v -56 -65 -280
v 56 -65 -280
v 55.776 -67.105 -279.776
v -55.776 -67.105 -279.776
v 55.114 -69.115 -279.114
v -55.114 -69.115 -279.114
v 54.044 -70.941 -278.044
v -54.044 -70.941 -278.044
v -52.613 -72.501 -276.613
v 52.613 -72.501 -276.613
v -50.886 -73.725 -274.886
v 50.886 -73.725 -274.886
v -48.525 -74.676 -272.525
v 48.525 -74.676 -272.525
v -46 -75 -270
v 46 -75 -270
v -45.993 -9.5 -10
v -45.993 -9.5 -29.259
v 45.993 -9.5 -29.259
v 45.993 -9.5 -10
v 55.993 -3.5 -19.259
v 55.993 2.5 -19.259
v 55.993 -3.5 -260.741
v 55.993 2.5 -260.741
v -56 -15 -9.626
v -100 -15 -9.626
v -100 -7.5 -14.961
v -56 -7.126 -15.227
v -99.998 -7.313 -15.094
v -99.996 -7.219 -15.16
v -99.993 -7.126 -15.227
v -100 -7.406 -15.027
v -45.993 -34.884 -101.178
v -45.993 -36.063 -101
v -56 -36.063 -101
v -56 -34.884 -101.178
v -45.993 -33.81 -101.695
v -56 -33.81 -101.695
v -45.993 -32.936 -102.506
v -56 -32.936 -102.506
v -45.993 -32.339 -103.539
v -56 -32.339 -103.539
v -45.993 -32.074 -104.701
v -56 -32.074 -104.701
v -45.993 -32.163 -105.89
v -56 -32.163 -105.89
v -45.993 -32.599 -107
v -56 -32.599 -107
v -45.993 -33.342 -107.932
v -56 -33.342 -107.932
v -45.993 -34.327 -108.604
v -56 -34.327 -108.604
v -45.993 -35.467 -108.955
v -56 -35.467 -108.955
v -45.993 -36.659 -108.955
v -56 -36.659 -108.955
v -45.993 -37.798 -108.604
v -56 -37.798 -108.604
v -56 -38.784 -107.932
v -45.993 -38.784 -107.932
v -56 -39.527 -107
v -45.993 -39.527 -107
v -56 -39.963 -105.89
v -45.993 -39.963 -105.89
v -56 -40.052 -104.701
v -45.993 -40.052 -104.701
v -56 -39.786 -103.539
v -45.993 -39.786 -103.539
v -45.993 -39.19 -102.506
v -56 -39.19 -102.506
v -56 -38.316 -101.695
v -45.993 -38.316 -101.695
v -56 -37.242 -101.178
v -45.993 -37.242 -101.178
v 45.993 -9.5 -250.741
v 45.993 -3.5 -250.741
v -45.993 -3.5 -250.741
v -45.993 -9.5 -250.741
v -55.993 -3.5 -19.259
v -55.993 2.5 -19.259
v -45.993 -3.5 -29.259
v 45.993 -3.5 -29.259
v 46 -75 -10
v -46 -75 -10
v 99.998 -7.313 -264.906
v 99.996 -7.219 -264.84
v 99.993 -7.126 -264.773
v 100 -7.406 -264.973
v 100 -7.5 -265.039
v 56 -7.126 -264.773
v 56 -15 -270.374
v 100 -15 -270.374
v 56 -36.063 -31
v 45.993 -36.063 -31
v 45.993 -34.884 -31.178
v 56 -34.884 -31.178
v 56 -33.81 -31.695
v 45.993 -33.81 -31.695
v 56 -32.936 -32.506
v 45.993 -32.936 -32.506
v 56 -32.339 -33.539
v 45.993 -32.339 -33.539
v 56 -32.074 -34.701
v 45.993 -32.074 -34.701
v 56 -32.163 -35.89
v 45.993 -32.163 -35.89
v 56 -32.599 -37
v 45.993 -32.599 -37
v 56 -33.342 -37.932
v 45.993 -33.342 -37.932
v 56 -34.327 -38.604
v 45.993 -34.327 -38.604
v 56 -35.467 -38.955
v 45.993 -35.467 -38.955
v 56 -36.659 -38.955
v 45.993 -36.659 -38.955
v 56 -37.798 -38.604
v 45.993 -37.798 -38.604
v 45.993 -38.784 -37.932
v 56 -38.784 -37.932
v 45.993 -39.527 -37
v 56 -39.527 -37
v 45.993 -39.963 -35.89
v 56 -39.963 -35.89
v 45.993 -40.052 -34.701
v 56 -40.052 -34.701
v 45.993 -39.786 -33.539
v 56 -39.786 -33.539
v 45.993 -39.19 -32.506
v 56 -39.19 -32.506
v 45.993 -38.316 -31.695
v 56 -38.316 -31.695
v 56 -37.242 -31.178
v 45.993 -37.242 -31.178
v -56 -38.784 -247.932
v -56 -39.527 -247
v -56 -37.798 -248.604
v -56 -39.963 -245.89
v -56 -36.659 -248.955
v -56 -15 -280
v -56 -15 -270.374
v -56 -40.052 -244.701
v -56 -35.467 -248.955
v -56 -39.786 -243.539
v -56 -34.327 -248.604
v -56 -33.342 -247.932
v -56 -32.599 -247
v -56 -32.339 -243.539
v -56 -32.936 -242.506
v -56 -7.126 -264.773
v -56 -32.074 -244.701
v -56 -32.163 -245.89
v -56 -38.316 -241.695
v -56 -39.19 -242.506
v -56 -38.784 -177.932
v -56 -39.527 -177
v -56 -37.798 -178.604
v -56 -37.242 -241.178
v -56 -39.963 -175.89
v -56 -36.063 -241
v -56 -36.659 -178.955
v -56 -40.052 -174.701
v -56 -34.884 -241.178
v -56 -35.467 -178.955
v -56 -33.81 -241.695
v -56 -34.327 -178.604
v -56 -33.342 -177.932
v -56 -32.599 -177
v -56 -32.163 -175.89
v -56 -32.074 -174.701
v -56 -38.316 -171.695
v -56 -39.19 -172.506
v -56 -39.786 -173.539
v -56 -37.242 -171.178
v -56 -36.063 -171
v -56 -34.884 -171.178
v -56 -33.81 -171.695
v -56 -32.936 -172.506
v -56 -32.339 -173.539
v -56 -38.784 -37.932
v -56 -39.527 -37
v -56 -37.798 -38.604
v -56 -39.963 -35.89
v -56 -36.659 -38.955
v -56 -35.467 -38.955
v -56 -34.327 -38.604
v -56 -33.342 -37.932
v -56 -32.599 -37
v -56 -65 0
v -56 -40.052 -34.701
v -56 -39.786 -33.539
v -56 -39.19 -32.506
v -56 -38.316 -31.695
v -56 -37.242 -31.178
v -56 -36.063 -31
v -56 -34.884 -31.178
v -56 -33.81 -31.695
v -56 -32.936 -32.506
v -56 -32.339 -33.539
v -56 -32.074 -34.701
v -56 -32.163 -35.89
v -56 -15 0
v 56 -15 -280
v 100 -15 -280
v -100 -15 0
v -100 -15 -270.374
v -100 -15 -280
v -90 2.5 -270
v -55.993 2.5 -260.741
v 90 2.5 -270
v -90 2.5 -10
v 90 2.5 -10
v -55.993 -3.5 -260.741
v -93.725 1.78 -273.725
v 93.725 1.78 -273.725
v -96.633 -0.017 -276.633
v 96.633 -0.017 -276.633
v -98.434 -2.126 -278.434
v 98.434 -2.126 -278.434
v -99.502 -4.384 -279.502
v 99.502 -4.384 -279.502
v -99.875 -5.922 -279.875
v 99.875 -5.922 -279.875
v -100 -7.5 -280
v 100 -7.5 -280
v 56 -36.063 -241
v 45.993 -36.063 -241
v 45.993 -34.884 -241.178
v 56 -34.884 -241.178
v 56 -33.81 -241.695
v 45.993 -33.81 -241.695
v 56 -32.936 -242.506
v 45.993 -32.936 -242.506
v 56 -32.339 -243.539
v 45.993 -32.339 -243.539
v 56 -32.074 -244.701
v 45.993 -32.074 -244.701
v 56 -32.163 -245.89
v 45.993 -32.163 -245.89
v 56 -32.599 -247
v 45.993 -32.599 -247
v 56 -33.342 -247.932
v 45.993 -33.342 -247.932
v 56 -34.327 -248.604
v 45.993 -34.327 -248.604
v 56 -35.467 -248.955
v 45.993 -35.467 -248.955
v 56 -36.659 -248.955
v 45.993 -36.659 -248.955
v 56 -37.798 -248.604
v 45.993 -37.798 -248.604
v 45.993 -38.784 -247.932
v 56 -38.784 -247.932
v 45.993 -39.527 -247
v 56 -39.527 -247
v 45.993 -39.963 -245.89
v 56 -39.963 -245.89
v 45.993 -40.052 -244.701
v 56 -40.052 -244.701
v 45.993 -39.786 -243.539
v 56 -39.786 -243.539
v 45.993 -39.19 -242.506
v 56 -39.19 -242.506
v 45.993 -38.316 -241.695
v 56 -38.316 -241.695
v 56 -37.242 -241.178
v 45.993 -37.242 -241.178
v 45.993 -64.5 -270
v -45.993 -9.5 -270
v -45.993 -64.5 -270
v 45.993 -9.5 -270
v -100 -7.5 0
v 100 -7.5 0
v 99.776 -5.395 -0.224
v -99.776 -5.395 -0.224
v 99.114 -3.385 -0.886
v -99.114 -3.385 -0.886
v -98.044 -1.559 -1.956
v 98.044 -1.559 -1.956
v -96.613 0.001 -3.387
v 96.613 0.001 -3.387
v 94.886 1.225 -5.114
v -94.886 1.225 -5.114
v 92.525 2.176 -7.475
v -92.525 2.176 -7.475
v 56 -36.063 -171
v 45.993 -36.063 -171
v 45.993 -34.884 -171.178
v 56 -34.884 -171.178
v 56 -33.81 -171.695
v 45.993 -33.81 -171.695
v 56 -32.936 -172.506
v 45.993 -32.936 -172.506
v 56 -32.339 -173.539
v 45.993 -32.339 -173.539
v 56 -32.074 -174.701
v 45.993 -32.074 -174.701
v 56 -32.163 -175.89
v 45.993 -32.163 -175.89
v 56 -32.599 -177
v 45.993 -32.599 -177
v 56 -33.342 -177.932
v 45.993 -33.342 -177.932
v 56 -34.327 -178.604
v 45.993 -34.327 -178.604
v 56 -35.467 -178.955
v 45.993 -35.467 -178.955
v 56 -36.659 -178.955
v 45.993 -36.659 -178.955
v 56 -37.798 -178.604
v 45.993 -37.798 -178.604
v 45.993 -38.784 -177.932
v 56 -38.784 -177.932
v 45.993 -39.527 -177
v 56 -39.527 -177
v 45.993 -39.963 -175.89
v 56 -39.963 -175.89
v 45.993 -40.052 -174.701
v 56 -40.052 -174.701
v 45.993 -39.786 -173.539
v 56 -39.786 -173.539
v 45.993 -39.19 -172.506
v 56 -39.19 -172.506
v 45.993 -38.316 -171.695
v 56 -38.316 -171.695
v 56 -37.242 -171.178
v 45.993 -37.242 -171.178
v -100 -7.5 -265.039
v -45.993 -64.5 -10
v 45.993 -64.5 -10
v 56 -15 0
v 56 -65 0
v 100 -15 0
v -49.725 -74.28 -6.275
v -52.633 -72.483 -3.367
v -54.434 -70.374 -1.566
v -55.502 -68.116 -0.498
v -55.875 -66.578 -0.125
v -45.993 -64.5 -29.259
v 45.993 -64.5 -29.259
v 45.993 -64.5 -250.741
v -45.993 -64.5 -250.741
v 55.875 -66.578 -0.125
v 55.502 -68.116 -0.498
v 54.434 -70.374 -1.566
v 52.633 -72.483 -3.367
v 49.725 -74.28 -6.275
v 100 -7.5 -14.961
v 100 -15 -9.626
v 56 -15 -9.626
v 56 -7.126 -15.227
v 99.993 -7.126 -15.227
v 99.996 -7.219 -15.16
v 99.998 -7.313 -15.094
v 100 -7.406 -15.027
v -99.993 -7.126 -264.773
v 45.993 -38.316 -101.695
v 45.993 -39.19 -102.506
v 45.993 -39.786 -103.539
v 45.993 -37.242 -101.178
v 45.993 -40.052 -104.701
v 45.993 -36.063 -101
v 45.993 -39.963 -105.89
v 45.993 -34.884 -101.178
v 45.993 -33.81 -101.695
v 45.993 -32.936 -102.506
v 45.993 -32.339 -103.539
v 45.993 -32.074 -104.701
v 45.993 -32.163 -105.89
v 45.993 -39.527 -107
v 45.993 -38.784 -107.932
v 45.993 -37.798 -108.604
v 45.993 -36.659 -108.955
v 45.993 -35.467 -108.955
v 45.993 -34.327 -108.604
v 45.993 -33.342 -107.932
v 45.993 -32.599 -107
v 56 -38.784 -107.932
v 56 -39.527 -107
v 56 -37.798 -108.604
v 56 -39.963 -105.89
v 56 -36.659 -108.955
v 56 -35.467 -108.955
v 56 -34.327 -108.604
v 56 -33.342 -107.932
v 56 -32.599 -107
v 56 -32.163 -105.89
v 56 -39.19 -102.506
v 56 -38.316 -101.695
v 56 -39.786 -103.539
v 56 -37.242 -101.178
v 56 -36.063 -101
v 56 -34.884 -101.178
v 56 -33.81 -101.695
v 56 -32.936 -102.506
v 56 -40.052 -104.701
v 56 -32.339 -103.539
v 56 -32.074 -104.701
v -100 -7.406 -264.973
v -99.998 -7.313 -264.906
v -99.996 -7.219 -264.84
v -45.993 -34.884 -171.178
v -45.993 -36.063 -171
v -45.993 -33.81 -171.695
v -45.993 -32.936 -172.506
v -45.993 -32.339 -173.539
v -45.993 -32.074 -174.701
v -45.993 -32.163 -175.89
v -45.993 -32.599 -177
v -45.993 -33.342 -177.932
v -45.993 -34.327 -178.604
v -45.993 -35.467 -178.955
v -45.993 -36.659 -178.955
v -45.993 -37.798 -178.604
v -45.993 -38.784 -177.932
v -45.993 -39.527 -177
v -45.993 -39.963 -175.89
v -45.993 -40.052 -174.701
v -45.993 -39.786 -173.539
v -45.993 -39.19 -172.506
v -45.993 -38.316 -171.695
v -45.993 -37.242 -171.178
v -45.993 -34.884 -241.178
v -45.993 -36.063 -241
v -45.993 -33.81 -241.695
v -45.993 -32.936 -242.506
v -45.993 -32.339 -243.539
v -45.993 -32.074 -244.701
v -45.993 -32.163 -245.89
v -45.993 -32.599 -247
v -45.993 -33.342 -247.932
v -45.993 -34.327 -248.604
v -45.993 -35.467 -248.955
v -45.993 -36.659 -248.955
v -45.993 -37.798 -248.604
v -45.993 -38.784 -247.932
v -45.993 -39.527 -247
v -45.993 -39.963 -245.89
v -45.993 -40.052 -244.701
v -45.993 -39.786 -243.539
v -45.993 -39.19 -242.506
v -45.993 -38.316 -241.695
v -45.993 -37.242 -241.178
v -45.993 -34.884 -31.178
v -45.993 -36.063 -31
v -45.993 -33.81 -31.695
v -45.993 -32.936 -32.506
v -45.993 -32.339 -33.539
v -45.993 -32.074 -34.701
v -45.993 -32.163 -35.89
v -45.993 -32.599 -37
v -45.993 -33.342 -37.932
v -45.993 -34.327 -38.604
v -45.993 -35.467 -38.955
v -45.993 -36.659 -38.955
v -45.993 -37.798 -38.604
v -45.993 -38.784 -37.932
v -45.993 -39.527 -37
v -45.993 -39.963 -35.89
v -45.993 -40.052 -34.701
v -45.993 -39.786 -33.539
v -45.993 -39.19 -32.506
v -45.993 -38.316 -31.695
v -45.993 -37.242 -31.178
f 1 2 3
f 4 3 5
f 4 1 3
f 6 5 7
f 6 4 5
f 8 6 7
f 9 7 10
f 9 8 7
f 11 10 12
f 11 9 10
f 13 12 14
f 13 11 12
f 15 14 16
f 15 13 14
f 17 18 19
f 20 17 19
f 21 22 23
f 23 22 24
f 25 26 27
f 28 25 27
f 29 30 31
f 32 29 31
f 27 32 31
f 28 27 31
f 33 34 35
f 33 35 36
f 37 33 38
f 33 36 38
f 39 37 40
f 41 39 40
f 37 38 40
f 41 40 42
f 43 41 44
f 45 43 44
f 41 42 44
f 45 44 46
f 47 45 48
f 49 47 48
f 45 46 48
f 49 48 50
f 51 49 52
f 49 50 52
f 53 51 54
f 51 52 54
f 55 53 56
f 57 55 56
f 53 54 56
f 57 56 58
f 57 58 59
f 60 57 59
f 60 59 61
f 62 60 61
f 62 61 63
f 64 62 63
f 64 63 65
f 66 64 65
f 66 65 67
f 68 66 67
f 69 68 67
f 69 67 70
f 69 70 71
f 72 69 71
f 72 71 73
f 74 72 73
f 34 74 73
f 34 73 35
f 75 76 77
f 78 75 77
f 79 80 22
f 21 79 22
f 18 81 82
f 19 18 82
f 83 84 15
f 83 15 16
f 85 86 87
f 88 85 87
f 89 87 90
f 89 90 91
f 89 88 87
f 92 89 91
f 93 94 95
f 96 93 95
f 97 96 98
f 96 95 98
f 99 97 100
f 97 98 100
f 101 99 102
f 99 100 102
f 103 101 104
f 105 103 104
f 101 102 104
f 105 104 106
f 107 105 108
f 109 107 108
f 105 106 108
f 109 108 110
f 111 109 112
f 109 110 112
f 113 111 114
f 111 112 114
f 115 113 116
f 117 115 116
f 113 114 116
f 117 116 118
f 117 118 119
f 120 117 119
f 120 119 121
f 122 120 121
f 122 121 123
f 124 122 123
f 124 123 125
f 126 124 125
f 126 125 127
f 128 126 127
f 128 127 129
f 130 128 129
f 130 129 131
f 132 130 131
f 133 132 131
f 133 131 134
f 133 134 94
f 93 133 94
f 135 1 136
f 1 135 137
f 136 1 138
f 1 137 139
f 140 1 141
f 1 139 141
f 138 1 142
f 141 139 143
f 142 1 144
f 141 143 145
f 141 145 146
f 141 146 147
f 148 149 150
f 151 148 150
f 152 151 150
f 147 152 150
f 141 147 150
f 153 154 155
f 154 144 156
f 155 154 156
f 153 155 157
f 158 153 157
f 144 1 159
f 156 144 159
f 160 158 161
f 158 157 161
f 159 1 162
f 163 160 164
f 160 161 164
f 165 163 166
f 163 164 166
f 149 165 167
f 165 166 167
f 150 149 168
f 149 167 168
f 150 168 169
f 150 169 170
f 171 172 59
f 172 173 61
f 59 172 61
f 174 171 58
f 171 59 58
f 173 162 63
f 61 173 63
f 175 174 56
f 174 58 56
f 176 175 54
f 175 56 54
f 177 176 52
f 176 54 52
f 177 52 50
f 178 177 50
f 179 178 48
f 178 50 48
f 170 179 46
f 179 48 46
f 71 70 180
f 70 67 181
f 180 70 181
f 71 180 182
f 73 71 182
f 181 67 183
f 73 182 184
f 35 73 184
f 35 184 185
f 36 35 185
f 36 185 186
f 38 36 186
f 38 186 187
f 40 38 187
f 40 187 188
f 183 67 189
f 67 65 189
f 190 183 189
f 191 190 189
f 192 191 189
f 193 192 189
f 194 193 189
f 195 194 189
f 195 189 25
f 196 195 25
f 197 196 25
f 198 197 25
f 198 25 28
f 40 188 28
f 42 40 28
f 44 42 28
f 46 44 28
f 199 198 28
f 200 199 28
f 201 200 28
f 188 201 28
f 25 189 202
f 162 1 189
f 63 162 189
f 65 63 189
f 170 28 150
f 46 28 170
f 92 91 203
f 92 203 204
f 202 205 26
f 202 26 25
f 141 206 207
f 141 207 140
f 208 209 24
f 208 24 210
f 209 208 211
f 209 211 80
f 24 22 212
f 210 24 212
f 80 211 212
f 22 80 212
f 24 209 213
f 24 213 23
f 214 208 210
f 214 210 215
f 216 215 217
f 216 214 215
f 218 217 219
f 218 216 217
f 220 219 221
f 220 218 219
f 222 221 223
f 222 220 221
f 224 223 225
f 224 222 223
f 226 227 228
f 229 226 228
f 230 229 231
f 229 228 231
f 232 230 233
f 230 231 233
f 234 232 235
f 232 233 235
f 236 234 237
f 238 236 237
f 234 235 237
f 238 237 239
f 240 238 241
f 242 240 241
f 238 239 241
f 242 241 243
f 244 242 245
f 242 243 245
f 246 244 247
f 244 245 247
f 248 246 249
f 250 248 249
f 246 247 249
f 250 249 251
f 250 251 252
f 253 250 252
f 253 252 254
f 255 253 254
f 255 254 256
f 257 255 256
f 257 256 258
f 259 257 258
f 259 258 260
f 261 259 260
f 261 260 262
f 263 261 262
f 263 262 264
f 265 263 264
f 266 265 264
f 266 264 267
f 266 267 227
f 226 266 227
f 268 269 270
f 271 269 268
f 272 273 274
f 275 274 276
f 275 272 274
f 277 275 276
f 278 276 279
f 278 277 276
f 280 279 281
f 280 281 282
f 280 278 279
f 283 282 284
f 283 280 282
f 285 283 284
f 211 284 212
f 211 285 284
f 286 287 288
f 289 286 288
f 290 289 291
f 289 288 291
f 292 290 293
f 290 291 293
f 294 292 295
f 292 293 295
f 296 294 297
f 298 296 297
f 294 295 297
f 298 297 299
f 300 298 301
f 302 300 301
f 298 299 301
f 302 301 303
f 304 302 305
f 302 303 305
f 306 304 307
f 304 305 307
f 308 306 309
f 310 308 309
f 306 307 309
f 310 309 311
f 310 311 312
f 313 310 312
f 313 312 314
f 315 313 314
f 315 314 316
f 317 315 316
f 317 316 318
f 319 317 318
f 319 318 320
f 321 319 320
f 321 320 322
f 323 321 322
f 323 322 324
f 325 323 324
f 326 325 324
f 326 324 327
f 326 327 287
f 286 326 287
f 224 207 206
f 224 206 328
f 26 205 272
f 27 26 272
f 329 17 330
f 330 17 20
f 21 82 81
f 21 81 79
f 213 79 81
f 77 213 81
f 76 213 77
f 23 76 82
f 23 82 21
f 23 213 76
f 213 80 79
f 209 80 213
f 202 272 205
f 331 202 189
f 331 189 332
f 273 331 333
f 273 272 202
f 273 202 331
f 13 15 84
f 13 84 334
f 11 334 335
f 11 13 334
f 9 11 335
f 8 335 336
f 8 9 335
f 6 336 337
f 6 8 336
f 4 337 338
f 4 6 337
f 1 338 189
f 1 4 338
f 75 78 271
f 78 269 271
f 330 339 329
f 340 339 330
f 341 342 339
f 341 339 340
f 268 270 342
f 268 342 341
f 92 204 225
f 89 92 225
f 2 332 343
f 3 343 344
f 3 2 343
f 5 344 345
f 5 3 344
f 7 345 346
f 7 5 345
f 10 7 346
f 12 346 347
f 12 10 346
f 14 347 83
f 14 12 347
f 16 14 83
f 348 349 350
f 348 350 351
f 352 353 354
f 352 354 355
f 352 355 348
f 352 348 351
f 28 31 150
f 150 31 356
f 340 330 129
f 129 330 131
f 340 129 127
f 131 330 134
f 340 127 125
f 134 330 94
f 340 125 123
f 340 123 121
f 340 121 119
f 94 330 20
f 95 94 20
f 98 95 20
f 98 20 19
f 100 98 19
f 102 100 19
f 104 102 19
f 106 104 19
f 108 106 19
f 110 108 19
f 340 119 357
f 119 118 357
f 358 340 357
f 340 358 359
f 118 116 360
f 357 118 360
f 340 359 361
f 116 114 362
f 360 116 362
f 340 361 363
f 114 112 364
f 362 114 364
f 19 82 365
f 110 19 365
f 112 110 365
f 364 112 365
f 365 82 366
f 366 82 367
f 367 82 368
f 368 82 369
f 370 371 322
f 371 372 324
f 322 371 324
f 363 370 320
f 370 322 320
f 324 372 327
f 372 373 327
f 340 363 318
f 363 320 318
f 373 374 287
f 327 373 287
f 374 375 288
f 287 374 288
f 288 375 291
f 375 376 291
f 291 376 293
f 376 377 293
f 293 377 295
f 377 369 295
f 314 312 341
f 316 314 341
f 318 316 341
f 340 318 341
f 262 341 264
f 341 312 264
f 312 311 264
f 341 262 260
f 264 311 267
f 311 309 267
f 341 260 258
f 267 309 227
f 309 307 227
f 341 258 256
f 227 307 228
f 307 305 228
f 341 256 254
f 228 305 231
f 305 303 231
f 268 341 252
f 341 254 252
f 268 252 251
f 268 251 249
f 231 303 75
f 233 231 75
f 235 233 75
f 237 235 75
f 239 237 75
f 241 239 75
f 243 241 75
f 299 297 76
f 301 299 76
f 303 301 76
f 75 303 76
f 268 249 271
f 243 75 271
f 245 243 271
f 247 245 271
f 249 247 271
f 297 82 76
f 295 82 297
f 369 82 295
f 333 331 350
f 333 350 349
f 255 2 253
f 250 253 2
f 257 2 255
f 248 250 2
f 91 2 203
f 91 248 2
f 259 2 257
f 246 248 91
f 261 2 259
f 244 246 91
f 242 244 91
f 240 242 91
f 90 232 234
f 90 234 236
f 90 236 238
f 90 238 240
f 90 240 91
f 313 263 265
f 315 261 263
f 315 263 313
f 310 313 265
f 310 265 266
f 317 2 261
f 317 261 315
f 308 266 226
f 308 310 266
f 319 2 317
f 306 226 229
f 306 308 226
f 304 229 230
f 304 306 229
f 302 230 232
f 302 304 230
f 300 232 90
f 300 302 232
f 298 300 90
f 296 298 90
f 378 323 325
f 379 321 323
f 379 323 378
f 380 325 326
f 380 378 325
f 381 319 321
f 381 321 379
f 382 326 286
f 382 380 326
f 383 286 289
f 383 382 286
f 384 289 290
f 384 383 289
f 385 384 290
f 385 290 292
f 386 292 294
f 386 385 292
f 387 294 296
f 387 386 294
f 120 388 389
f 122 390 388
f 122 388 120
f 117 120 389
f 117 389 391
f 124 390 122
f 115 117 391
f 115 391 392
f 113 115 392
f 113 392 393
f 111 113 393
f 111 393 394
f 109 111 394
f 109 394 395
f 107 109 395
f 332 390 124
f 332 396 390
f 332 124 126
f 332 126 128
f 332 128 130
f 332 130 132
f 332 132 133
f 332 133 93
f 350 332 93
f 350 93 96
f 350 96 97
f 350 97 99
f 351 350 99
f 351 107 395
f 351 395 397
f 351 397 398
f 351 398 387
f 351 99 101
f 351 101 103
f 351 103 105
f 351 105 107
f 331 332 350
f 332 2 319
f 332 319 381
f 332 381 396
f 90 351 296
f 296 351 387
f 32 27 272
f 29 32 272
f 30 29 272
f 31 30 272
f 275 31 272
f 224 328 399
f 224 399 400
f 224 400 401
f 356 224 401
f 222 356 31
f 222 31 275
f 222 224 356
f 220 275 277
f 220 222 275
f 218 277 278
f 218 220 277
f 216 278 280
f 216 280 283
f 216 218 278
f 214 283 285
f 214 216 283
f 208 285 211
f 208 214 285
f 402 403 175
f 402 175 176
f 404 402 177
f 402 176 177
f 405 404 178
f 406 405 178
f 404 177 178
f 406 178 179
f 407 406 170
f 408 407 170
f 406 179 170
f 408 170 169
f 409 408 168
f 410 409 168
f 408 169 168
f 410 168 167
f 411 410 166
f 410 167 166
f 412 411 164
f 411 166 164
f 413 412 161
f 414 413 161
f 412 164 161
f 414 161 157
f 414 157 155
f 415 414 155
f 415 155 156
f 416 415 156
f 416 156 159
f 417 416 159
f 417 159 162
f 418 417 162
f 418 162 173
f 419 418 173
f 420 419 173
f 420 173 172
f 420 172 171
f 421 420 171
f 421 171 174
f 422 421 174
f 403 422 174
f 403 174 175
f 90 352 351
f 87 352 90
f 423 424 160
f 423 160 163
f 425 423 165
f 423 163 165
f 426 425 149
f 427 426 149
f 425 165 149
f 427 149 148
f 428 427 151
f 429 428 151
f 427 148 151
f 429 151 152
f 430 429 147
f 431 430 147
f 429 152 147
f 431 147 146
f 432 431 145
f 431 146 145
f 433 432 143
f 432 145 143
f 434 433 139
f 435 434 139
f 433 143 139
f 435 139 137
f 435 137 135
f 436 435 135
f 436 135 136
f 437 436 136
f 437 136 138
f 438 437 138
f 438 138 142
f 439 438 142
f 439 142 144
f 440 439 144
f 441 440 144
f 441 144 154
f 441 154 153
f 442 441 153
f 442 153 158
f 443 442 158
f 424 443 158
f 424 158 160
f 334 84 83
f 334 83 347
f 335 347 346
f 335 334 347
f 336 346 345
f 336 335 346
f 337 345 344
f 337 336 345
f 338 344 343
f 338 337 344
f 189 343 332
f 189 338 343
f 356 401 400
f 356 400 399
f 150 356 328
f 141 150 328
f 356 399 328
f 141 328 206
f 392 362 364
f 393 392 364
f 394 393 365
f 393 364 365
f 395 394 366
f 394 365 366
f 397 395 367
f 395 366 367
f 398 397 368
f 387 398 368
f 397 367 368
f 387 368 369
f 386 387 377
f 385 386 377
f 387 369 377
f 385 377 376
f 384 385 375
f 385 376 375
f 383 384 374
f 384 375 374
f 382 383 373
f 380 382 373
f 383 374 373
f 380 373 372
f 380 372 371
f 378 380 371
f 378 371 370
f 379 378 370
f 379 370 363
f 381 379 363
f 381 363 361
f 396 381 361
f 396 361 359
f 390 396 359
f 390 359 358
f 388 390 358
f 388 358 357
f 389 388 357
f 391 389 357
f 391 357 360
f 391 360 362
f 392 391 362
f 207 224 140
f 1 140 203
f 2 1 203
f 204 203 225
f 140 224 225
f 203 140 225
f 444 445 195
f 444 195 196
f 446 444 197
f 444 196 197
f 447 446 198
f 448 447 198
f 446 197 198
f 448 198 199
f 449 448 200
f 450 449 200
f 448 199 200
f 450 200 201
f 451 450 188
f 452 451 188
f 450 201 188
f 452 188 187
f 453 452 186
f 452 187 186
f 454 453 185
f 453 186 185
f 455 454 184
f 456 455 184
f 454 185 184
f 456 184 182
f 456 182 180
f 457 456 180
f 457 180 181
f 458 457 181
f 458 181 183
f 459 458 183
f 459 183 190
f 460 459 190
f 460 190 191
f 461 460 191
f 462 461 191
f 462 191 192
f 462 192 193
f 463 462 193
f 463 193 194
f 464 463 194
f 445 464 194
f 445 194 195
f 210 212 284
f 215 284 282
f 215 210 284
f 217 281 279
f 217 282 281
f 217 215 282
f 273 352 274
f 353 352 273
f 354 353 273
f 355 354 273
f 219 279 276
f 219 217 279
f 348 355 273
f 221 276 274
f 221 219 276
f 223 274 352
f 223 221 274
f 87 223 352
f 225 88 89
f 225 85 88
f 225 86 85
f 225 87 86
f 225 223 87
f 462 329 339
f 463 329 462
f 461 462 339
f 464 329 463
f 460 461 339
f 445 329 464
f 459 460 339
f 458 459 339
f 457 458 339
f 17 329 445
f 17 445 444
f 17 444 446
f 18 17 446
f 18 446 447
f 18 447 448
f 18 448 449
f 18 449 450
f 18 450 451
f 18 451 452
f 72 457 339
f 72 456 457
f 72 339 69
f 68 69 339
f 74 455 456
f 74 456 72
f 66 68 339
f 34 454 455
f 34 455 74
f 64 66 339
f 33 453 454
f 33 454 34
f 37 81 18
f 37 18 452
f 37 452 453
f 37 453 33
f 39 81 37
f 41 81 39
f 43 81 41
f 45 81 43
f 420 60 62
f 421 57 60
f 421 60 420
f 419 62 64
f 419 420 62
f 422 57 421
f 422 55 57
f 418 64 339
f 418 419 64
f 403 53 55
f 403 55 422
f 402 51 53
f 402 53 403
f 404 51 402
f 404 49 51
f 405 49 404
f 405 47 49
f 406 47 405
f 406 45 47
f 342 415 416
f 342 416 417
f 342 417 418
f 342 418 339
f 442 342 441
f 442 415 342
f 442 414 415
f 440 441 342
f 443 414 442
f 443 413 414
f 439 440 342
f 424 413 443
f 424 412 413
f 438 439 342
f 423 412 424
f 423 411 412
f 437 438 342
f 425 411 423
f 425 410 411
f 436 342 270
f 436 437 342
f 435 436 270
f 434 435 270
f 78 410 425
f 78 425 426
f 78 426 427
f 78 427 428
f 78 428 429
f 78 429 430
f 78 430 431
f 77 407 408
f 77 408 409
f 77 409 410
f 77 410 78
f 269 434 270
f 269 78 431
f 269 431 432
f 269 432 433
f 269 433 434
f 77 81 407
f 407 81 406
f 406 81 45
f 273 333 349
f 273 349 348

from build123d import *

# Parameters (mm, degrees)
SKETCH1_W           = 200
SKETCH1_H           = 150
BOSS_EXTRUDE1_DEPTH = 280
SKETCH2_W           = 44
SKETCH2_H           = 60
SKETCH2_W_2         = 34
SKETCH2_H_2         = 72.5
CUT_EXTRUDE1_DEPTH  = 280
CUT_EXTRUDE5_DEPTH  = 200
CUT_EXTRUDE8_DEPTH  = 44
CUT_EXTRUDE9_DEPTH  = 44
SKETCH6_W           = 112
SKETCH6_H           = 52.5
CUT_EXTRUDE7_DEPTH  = 280
FILLET1_START       = -100
FILLET1_DEPTH       = 200
FILLET1_START_2     = -76
FILLET1_2_DEPTH     = 10
FILLET1_START_3     = 66
FILLET1_3_DEPTH     = 10
FILLET1_START_4     = -66
FILLET1_4_DEPTH     = 132
FILLET1_START_5     = -281
FILLET1_5_DEPTH     = 282
SKETCH8_W           = 152
SKETCH8_H           = 72.5
CUT_EXTRUDE10_DEPTH = 280
SKETCH9_W           = 111.98598877
SKETCH9_H           = 241.482238642
SKETCH9_W_2         = 91.98598877
SKETCH9_H_2         = 221.482238642
SKETCH9_H_3         = 10
CUT_EXTRUDE11_DEPTH = 6
SKETCH9_3_W         = 45.992994385
SKETCH9_3_H         = 221.482238642
CUT_EXTRUDE12_DEPTH = 67
CUT_EXTRUDE13_START = -12
SKETCH9_7_W         = 91.98598877
SKETCH9_7_H         = 9.258880679
CUT_EXTRUDE13_DEPTH = 55
CUT_EXTRUDE14_START = -12
SKETCH9_9_W         = 91.98598877
SKETCH9_9_H         = 10
CUT_EXTRUDE14_DEPTH = 55
CUT_EXTRUDE15_REACH = 331.182
SKETCH11_R          = 4


with BuildPart() as part:
    # Sketch1 → Boss-Extrude1 (new body)
    with BuildSketch(Plane.XY):
        Rectangle(SKETCH1_W, SKETCH1_H)
    extrude(amount=-BOSS_EXTRUDE1_DEPTH)

    # Sketch2 → Cut-Extrude1 (cut)
    with BuildSketch(Plane.XY):
        with Locations((78, -45)):
            Rectangle(SKETCH2_W, SKETCH2_H)
        with Locations((-78, -45)):
            Rectangle(SKETCH2_W, SKETCH2_H)
        with Locations((83, 38.75)):
            Rectangle(SKETCH2_W_2, SKETCH2_H_2)
        with Locations((-83, 38.75)):
            Rectangle(SKETCH2_W_2, SKETCH2_H_2)
    extrude(amount=-CUT_EXTRUDE1_DEPTH, mode=Mode.SUBTRACT)

    # Sketch3 → Cut-Extrude5 (cut)
    with BuildSketch(Plane.ZY.offset(100)):
        Polygon((-280, 2.5), (-274.399041425, 2.5), (-252, 2.5), (-218.971094498, 75), (-280, 75), align=None)
        Polygon((-236.455453487, 12.5), (-168.766953205, 12.5), (-60.438488841, 12.5), (-94.602997447, 65), (-144.84946991, 65), (-212.537970192, 65), align=None)
        Polygon((-89.179559504, 75), (-42, 2.5), (-5.600958575, 2.5), (0, 2.5), (0, 75), align=None)
    extrude(amount=-CUT_EXTRUDE5_DEPTH, mode=Mode.SUBTRACT)

    # Sketch5 → Cut-Extrude8 (cut)
    with BuildSketch(Plane.ZY.offset(100)):
        Polygon((-264.773291637, -7.125749789), (-270.374250211, -15), (-140, -15), (-140, -7.125749789), align=None)
        Polygon((-15.226708363, -7.125749789), (-140, -7.125749789), (-140, -15), (-9.625749789, -15), align=None)
    extrude(amount=-CUT_EXTRUDE8_DEPTH, mode=Mode.SUBTRACT)

    # Sketch7 → Cut-Extrude9 (cut)
    with BuildSketch(Plane(origin=(100, 0, 0), x_dir=(0, 0, -1), z_dir=(1, 0, 0))):
        Polygon((9.625749789, -15), (15.226708363, -7.125749789), (264.773291637, -7.125749789), (270.374250211, -15), align=None)
    extrude(amount=-CUT_EXTRUDE9_DEPTH, mode=Mode.SUBTRACT)

    # Sketch6 → Cut-Extrude7 (cut)
    with BuildSketch(Plane.XY):
        with Locations((0, 38.75)):
            Rectangle(SKETCH6_W, SKETCH6_H)
    extrude(amount=-CUT_EXTRUDE7_DEPTH, mode=Mode.SUBTRACT)

    # Fillet1: read off the stored shape, not the designer's step
    # Fillet1 outline → Fillet1 (cut)
    with BuildSketch(Plane.YZ.offset(FILLET1_START)):
        with BuildLine():
            Line((-75, 0), (-75, -10))
            ThreePointArc((-75, -10), (-72.071067812, -2.928932188), (-65, 0))
            Line((-65, 0), (-75, 0))
        make_face()
        with BuildLine():
            ThreePointArc((-65, -280), (-72.071067812, -277.071067812), (-75, -270))
            Line((-75, -270), (-75, -280))
            Line((-75, -280), (-65, -280))
        make_face()
        with BuildLine():
            Line((2.5, 0), (-7.5, 0))
            ThreePointArc((-7.5, 0), (-0.428932188, -2.928932188), (2.5, -10))
            Line((2.5, -10), (2.5, 0))
        make_face()
        with BuildLine():
            ThreePointArc((2.5, -270), (-0.428932188, -277.071067812), (-7.5, -280))
            Line((-7.5, -280), (2.5, -280))
            Line((2.5, -280), (2.5, -270))
        make_face()
        with BuildLine():
            Line((75, -89.179559504), (70.454316835, -86.221444616))
            ThreePointArc((70.454316835, -86.221444616), (73.790425711, -89.835564613), (75, -94.602997447))
            Line((75, -94.602997447), (75, -89.179559504))
        make_face()
        with BuildLine():
            ThreePointArc((75, -212.537970192), (73.410042611, -217.948255145), (69.145763344, -221.638115591))
            Line((69.145763344, -221.638115591), (75, -218.971094498))
            Line((75, -218.971094498), (75, -212.537970192))
        make_face()
    extrude(amount=FILLET1_DEPTH, mode=Mode.SUBTRACT)

    # Fillet1 2 outline → Fillet1 2 (add)
    with BuildSketch(Plane.YZ.offset(FILLET1_START_2)):
        with BuildLine():
            ThreePointArc((7.045683165, -44.958114888), (3.709574289, -41.343994891), (2.5, -36.576562057))
            Line((2.5, -36.576562057), (2.5, -258.433124306))
            ThreePointArc((2.5, -258.433124306), (4.089957389, -253.022839352), (8.354236656, -249.332978906))
            Line((8.354236656, -249.332978906), (69.145763344, -221.638115591))
            ThreePointArc((69.145763344, -221.638115591), (73.410042611, -217.948255145), (75, -212.537970192))
            Line((75, -212.537970192), (75, -94.602997447))
            ThreePointArc((75, -94.602997447), (73.790425711, -89.835564613), (70.454316835, -86.221444616))
            Line((70.454316835, -86.221444616), (7.045683165, -44.958114888))
        make_face()
    extrude(amount=FILLET1_2_DEPTH)

    # Fillet1 3 outline → Fillet1 3 (add)
    with BuildSketch(Plane.YZ.offset(FILLET1_START_3)):
        with BuildLine():
            ThreePointArc((7.045683165, -44.958114888), (3.709574289, -41.343994891), (2.5, -36.576562057))
            Line((2.5, -36.576562057), (2.5, -258.433124306))
            ThreePointArc((2.5, -258.433124306), (4.089957389, -253.022839352), (8.354236656, -249.332978906))
            Line((8.354236656, -249.332978906), (69.145763344, -221.638115591))
            ThreePointArc((69.145763344, -221.638115591), (73.410042611, -217.948255145), (75, -212.537970192))
            Line((75, -212.537970192), (75, -94.602997447))
            ThreePointArc((75, -94.602997447), (73.790425711, -89.835564613), (70.454316835, -86.221444616))
            Line((70.454316835, -86.221444616), (7.045683165, -44.958114888))
        make_face()
    extrude(amount=FILLET1_3_DEPTH)

    # Fillet1 4 outline → Fillet1 4 (add)
    with BuildSketch(Plane.YZ.offset(FILLET1_START_4)):
        with BuildLine():
            ThreePointArc((7.045683165, -44.958114888), (3.709574289, -41.343994891), (2.5, -36.576562057))
            Line((2.5, -36.576562057), (2.5, -42))
            Line((2.5, -42), (7.045683165, -44.958114888))
        make_face()
        with BuildLine():
            Line((2.5, -252), (2.5, -258.433124306))
            ThreePointArc((2.5, -258.433124306), (4.089957389, -253.022839352), (8.354236656, -249.332978906))
            Line((8.354236656, -249.332978906), (2.5, -252))
        make_face()
    extrude(amount=FILLET1_4_DEPTH)

    # Fillet1 5 outline → Fillet1 5 (cut)
    with BuildSketch(Plane.XY.offset(FILLET1_START_5)):
        with BuildLine():
            ThreePointArc((56, 75), (63.071067812, 72.071067812), (66, 65))
            Line((66, 65), (66, 12.5))
            ThreePointArc((66, 12.5), (68.928932188, 5.428932188), (76, 2.5))
            Line((76, 2.5), (76, 75))
            Line((76, 75), (56, 75))
        make_face()
        with BuildLine():
            ThreePointArc((-66, 65), (-63.071067812, 72.071067812), (-56, 75))
            Line((-56, 75), (-76, 75))
            Line((-76, 75), (-76, 2.5))
            ThreePointArc((-76, 2.5), (-68.928932188, 5.428932188), (-66, 12.5))
            Line((-66, 12.5), (-66, 65))
        make_face()
        with BuildLine():
            Line((100, 2.5), (90, 2.5))
            ThreePointArc((90, 2.5), (97.071067812, -0.428932188), (100, -7.5))
            Line((100, -7.5), (100, 2.5))
        make_face()
        with BuildLine():
            Line((-90, 2.5), (-100, 2.5))
            Line((-100, 2.5), (-100, -7.5))
            ThreePointArc((-100, -7.5), (-97.071067812, -0.428932188), (-90, 2.5))
        make_face()
        with BuildLine():
            Line((56, -75), (56, -65))
            ThreePointArc((56, -65), (53.071067812, -72.071067812), (46, -75))
            Line((46, -75), (56, -75))
        make_face()
        with BuildLine():
            ThreePointArc((-46, -75), (-53.071067812, -72.071067812), (-56, -65))
            Line((-56, -65), (-56, -75))
            Line((-56, -75), (-46, -75))
        make_face()
    extrude(amount=FILLET1_5_DEPTH, mode=Mode.SUBTRACT)

    # Sketch8 → Cut-Extrude10 (cut)
    with BuildSketch(Plane.XY):
        with Locations((0, 38.75)):
            Rectangle(SKETCH8_W, SKETCH8_H)
    extrude(amount=-CUT_EXTRUDE10_DEPTH, mode=Mode.SUBTRACT)

    # Sketch9 → Cut-Extrude11 (cut)
    # profile 1 of 4: a face of its own
    with BuildSketch(Plane(origin=(0, 2.5, 0), x_dir=(1, 0, 0), z_dir=(0, 1, 0))):
        with Locations((0, 140)):
            Rectangle(SKETCH9_W, SKETCH9_H)
        with Locations((0, 140)):
            Rectangle(SKETCH9_W_2, SKETCH9_H_2, mode=Mode.SUBTRACT)
    # profile 2 of 4: a face of its own
    with BuildSketch(Plane(origin=(0, 2.5, 0), x_dir=(1, 0, 0), z_dir=(0, 1, 0))):
        Polygon((55.992994385, 260.741119321), (45.992994385, 260.741119321), (45.992994385, 250.741119321), (45.992994385, 29.258880679), (45.992994385, 19.258880679), (55.992994385, 19.258880679), align=None)
    # profile 3 of 4: a face of its own
    with BuildSketch(Plane(origin=(0, 2.5, 0), x_dir=(1, 0, 0), z_dir=(0, 1, 0))):
        with Locations((0, 255.741119321)):
            Rectangle(SKETCH9_W_2, SKETCH9_H_3)
    # profile 4 of 4: a face of its own
    with BuildSketch(Plane(origin=(0, 2.5, 0), x_dir=(1, 0, 0), z_dir=(0, 1, 0))):
        with Locations((0, 24.258880679)):
            Rectangle(SKETCH9_W_2, SKETCH9_H_3)
    extrude(amount=-CUT_EXTRUDE11_DEPTH, mode=Mode.SUBTRACT)

    # Sketch9<3> → Cut-Extrude12 (cut)
    with BuildSketch(Plane(origin=(0, 2.5, 0), x_dir=(1, 0, 0), z_dir=(0, 1, 0))):
        with Locations((-22.996497193, 140)):
            Rectangle(SKETCH9_3_W, SKETCH9_3_H)
        with Locations((22.996497193, 140)):
            Rectangle(SKETCH9_3_W, SKETCH9_3_H)
    extrude(amount=-CUT_EXTRUDE12_DEPTH, mode=Mode.SUBTRACT)

    # Sketch9<7> → Cut-Extrude13 (cut)
    with BuildSketch(Plane(origin=(0, 2.5, 0), x_dir=(1, 0, 0), z_dir=(0, 1, 0)).offset(CUT_EXTRUDE13_START)):
        with Locations((0, 265.370559661)):
            Rectangle(SKETCH9_7_W, SKETCH9_7_H)
        with Locations((0, 14.62944034)):
            Rectangle(SKETCH9_7_W, SKETCH9_7_H)
    extrude(amount=-CUT_EXTRUDE13_DEPTH, mode=Mode.SUBTRACT)

    # Sketch9<9> → Cut-Extrude14 (cut)
    with BuildSketch(Plane(origin=(0, 2.5, 0), x_dir=(1, 0, 0), z_dir=(0, 1, 0)).offset(CUT_EXTRUDE14_START)):
        with Locations((0, 255.741119321)):
            Rectangle(SKETCH9_9_W, SKETCH9_9_H)
        with Locations((0, 24.258880679)):
            Rectangle(SKETCH9_9_W, SKETCH9_9_H)
    extrude(amount=-CUT_EXTRUDE14_DEPTH, mode=Mode.SUBTRACT)

    # Cut-Extrude15: up to this face of the body (flat: up to its plane)
    cut_extrude15_end = Plane(part.part.faces().sort_by_distance((56, -36.372089238, -140))[0])
    # Sketch11 → Cut-Extrude15 (cut, up to the picked face)
    with BuildSketch(Plane.ZY.offset(56), mode=Mode.PRIVATE) as cut_extrude15_sk1:
        with Locations((-35, -36.062874894)):
            Circle(SKETCH11_R)
    cut_extrude15_tool1 = split(extrude(cut_extrude15_sk1.sketch, amount=-CUT_EXTRUDE15_REACH, mode=Mode.PRIVATE), bisect_by=cut_extrude15_end, keep=Keep.BOTH, mode=Mode.PRIVATE)
    # Sketch11 → Cut-Extrude15 (cut, up to the picked face)
    with BuildSketch(Plane.ZY.offset(56), mode=Mode.PRIVATE) as cut_extrude15_sk2:
        with Locations((-105, -36.062874894)):
            Circle(SKETCH11_R)
    cut_extrude15_tool2 = split(extrude(cut_extrude15_sk2.sketch, amount=-CUT_EXTRUDE15_REACH, mode=Mode.PRIVATE), bisect_by=cut_extrude15_end, keep=Keep.BOTH, mode=Mode.PRIVATE)
    # Sketch11 → Cut-Extrude15 (cut, up to the picked face)
    with BuildSketch(Plane.ZY.offset(56), mode=Mode.PRIVATE) as cut_extrude15_sk3:
        with Locations((-175, -36.062874894)):
            Circle(SKETCH11_R)
    cut_extrude15_tool3 = split(extrude(cut_extrude15_sk3.sketch, amount=-CUT_EXTRUDE15_REACH, mode=Mode.PRIVATE), bisect_by=cut_extrude15_end, keep=Keep.BOTH, mode=Mode.PRIVATE)
    # Sketch11 → Cut-Extrude15 (cut, up to the picked face)
    with BuildSketch(Plane.ZY.offset(56), mode=Mode.PRIVATE) as cut_extrude15_sk4:
        with Locations((-245, -36.062874894)):
            Circle(SKETCH11_R)
    cut_extrude15_tool4 = split(extrude(cut_extrude15_sk4.sketch, amount=-CUT_EXTRUDE15_REACH, mode=Mode.PRIVATE), bisect_by=cut_extrude15_end, keep=Keep.BOTH, mode=Mode.PRIVATE)
    add(cut_extrude15_tool1.solids().sort_by(Axis((-56, -36.062875, -35), (1, 0, 0)))[0], mode=Mode.SUBTRACT)
    add(cut_extrude15_tool2.solids().sort_by(Axis((-56, -36.062875, -105), (1, 0, 0)))[0], mode=Mode.SUBTRACT)
    add(cut_extrude15_tool3.solids().sort_by(Axis((-56, -36.062875, -175), (1, 0, 0)))[0], mode=Mode.SUBTRACT)
    add(cut_extrude15_tool4.solids().sort_by(Axis((-56, -36.062875, -245), (1, 0, 0)))[0], mode=Mode.SUBTRACT)


solid = part.part
